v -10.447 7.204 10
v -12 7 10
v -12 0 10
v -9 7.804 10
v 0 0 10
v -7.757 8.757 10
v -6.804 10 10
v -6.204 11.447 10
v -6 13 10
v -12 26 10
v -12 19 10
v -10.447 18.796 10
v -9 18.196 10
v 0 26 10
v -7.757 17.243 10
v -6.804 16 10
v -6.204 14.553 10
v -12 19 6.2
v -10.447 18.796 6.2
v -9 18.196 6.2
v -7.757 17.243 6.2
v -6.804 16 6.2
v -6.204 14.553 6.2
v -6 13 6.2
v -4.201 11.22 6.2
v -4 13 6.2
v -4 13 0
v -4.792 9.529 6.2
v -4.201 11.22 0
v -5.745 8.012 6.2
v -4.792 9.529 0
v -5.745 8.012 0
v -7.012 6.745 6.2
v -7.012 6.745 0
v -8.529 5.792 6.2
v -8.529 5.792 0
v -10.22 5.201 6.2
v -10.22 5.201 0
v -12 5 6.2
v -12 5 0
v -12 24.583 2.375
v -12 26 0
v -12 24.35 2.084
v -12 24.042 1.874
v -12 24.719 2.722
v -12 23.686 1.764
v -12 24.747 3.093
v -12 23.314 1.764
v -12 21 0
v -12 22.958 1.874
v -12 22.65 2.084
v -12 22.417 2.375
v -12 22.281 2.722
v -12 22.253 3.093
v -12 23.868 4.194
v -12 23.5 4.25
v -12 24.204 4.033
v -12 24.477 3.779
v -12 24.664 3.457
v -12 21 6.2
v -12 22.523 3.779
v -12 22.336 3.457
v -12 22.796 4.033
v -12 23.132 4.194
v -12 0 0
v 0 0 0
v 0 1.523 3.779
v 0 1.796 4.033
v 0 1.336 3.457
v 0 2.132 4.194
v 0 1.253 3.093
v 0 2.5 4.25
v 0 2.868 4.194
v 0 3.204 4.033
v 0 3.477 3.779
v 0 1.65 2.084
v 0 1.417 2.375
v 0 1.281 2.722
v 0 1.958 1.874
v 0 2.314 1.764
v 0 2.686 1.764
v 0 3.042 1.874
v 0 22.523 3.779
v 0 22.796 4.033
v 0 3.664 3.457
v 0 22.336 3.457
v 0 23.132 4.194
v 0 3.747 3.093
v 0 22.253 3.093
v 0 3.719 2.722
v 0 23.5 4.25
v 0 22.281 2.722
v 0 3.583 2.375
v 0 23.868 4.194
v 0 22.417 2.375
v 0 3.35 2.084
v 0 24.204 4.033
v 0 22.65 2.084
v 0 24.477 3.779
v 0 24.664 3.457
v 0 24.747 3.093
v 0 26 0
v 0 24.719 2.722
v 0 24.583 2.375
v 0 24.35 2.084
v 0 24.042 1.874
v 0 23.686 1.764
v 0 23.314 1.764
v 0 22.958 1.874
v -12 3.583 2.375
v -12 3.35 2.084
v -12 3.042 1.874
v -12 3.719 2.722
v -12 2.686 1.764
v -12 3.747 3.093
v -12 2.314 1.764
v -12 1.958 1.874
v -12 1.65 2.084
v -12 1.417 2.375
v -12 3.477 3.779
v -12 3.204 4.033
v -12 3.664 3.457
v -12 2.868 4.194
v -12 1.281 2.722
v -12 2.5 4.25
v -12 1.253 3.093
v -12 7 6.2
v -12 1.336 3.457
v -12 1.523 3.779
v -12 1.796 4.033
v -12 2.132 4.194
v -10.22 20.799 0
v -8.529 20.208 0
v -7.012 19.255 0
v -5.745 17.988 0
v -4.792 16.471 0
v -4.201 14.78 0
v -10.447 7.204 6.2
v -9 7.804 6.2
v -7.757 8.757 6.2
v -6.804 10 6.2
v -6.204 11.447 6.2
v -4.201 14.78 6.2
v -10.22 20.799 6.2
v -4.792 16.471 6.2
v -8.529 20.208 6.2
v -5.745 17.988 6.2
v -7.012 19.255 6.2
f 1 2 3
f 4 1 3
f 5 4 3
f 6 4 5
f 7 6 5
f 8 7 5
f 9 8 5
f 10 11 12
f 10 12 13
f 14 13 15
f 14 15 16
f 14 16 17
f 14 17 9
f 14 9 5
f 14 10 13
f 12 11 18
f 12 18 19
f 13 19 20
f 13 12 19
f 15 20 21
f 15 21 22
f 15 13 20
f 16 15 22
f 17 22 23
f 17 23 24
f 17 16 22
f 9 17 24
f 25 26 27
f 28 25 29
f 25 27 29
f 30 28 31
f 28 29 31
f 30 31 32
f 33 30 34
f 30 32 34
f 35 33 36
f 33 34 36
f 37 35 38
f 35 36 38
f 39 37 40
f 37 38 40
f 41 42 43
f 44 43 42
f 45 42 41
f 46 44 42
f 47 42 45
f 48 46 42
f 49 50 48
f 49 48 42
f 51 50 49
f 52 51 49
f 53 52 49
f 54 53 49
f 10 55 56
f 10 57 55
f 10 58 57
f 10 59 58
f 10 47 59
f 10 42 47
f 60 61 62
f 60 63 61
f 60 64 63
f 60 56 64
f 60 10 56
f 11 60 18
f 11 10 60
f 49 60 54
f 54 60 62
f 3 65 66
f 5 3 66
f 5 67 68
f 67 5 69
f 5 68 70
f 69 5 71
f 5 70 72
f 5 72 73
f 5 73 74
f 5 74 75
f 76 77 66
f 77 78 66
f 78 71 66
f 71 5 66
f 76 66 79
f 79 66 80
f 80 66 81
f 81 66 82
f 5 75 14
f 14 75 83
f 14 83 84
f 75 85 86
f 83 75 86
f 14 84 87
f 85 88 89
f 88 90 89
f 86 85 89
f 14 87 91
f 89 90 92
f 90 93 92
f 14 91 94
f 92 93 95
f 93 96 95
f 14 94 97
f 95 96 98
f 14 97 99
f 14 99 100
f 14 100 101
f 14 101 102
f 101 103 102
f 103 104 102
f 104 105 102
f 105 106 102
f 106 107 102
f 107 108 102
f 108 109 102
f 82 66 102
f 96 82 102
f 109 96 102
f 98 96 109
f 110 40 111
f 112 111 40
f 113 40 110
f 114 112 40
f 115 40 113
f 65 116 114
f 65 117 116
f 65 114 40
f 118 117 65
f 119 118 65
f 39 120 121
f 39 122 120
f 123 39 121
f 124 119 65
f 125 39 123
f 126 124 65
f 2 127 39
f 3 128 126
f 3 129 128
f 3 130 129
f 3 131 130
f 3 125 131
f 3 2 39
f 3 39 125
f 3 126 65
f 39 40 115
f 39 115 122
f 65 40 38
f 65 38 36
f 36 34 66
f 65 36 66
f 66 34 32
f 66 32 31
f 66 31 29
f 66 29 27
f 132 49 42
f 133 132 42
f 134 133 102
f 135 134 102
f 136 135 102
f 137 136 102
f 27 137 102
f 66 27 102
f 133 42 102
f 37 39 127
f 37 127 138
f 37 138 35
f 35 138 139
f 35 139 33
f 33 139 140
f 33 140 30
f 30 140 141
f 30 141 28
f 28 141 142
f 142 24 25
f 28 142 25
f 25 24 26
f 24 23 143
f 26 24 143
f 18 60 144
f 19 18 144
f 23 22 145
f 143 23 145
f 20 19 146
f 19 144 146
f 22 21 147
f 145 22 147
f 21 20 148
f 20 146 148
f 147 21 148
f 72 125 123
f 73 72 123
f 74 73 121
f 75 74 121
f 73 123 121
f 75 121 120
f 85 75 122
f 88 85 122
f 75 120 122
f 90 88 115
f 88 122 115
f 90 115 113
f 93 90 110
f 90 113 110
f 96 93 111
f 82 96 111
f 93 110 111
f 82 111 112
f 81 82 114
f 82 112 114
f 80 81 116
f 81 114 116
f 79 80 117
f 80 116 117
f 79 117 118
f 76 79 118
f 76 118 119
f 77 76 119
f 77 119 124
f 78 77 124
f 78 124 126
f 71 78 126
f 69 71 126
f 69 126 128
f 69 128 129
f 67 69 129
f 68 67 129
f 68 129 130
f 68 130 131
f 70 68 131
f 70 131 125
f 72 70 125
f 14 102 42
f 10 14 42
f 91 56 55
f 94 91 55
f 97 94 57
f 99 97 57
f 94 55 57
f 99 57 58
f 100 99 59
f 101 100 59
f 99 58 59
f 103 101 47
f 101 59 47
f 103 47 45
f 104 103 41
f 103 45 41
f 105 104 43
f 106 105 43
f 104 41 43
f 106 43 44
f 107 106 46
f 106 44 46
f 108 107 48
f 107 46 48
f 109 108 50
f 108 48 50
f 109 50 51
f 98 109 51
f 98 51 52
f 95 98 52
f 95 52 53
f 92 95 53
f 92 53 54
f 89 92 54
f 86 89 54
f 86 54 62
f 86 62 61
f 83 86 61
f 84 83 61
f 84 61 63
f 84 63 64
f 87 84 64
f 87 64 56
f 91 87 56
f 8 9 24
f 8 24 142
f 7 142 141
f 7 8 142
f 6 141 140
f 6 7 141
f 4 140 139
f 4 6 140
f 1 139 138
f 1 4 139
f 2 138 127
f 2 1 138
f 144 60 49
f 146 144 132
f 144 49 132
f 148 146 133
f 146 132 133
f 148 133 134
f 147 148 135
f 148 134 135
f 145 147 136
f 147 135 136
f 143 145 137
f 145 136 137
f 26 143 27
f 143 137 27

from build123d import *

# Parameters (mm, degrees)
BOSS_EXTRU_1_DEPTH      = 10
BOSS_EXTRU_2_DEPTH      = 3.8
ESQUISSE3_R             = 1.25
ENL_V_MAT_EXTRU_1_DEPTH = 13


with BuildPart() as part:
    # Esquisse1 → Boss.-Extru.1 (new body)
    with BuildSketch(Plane.XY):
        with BuildLine():
            Line((-12, 0), (0, 0))
            Line((0, 0), (0, 26))
            Line((0, 26), (-12, 26))
            Line((-12, 26), (-12, 21))
            ThreePointArc((-12, 21), (-6.343145751, 18.656854249), (-4, 13))
            ThreePointArc((-4, 13), (-6.343145751, 7.343145751), (-12, 5))
            Line((-12, 5), (-12, 0))
        make_face()
    extrude(amount=BOSS_EXTRU_1_DEPTH)

    # Esquisse2 → Boss.-Extru.2 (add)
    with BuildSketch(Plane.XY.offset(10)):
        with BuildLine():
            ThreePointArc((-12, 5), (-4, 13), (-12, 21))
            Line((-12, 21), (-12, 19))
            ThreePointArc((-12, 19), (-7.757359313, 17.242640687), (-6, 13))
            ThreePointArc((-6, 13), (-7.757359313, 8.757359313), (-12, 7))
            Line((-12, 7), (-12, 5))
        make_face()
    extrude(amount=-BOSS_EXTRU_2_DEPTH)

    # Esquisse3 → Enlèv. mat.-Extru.1 (cut, through all)
    with BuildSketch(Plane.ZY.offset(12)):
        with Locations((3, 23.5)):
            Circle(ESQUISSE3_R)
        with Locations((3, 2.5)):
            Circle(ESQUISSE3_R)
    extrude(amount=-ENL_V_MAT_EXTRU_1_DEPTH, mode=Mode.SUBTRACT)


solid = part.part
